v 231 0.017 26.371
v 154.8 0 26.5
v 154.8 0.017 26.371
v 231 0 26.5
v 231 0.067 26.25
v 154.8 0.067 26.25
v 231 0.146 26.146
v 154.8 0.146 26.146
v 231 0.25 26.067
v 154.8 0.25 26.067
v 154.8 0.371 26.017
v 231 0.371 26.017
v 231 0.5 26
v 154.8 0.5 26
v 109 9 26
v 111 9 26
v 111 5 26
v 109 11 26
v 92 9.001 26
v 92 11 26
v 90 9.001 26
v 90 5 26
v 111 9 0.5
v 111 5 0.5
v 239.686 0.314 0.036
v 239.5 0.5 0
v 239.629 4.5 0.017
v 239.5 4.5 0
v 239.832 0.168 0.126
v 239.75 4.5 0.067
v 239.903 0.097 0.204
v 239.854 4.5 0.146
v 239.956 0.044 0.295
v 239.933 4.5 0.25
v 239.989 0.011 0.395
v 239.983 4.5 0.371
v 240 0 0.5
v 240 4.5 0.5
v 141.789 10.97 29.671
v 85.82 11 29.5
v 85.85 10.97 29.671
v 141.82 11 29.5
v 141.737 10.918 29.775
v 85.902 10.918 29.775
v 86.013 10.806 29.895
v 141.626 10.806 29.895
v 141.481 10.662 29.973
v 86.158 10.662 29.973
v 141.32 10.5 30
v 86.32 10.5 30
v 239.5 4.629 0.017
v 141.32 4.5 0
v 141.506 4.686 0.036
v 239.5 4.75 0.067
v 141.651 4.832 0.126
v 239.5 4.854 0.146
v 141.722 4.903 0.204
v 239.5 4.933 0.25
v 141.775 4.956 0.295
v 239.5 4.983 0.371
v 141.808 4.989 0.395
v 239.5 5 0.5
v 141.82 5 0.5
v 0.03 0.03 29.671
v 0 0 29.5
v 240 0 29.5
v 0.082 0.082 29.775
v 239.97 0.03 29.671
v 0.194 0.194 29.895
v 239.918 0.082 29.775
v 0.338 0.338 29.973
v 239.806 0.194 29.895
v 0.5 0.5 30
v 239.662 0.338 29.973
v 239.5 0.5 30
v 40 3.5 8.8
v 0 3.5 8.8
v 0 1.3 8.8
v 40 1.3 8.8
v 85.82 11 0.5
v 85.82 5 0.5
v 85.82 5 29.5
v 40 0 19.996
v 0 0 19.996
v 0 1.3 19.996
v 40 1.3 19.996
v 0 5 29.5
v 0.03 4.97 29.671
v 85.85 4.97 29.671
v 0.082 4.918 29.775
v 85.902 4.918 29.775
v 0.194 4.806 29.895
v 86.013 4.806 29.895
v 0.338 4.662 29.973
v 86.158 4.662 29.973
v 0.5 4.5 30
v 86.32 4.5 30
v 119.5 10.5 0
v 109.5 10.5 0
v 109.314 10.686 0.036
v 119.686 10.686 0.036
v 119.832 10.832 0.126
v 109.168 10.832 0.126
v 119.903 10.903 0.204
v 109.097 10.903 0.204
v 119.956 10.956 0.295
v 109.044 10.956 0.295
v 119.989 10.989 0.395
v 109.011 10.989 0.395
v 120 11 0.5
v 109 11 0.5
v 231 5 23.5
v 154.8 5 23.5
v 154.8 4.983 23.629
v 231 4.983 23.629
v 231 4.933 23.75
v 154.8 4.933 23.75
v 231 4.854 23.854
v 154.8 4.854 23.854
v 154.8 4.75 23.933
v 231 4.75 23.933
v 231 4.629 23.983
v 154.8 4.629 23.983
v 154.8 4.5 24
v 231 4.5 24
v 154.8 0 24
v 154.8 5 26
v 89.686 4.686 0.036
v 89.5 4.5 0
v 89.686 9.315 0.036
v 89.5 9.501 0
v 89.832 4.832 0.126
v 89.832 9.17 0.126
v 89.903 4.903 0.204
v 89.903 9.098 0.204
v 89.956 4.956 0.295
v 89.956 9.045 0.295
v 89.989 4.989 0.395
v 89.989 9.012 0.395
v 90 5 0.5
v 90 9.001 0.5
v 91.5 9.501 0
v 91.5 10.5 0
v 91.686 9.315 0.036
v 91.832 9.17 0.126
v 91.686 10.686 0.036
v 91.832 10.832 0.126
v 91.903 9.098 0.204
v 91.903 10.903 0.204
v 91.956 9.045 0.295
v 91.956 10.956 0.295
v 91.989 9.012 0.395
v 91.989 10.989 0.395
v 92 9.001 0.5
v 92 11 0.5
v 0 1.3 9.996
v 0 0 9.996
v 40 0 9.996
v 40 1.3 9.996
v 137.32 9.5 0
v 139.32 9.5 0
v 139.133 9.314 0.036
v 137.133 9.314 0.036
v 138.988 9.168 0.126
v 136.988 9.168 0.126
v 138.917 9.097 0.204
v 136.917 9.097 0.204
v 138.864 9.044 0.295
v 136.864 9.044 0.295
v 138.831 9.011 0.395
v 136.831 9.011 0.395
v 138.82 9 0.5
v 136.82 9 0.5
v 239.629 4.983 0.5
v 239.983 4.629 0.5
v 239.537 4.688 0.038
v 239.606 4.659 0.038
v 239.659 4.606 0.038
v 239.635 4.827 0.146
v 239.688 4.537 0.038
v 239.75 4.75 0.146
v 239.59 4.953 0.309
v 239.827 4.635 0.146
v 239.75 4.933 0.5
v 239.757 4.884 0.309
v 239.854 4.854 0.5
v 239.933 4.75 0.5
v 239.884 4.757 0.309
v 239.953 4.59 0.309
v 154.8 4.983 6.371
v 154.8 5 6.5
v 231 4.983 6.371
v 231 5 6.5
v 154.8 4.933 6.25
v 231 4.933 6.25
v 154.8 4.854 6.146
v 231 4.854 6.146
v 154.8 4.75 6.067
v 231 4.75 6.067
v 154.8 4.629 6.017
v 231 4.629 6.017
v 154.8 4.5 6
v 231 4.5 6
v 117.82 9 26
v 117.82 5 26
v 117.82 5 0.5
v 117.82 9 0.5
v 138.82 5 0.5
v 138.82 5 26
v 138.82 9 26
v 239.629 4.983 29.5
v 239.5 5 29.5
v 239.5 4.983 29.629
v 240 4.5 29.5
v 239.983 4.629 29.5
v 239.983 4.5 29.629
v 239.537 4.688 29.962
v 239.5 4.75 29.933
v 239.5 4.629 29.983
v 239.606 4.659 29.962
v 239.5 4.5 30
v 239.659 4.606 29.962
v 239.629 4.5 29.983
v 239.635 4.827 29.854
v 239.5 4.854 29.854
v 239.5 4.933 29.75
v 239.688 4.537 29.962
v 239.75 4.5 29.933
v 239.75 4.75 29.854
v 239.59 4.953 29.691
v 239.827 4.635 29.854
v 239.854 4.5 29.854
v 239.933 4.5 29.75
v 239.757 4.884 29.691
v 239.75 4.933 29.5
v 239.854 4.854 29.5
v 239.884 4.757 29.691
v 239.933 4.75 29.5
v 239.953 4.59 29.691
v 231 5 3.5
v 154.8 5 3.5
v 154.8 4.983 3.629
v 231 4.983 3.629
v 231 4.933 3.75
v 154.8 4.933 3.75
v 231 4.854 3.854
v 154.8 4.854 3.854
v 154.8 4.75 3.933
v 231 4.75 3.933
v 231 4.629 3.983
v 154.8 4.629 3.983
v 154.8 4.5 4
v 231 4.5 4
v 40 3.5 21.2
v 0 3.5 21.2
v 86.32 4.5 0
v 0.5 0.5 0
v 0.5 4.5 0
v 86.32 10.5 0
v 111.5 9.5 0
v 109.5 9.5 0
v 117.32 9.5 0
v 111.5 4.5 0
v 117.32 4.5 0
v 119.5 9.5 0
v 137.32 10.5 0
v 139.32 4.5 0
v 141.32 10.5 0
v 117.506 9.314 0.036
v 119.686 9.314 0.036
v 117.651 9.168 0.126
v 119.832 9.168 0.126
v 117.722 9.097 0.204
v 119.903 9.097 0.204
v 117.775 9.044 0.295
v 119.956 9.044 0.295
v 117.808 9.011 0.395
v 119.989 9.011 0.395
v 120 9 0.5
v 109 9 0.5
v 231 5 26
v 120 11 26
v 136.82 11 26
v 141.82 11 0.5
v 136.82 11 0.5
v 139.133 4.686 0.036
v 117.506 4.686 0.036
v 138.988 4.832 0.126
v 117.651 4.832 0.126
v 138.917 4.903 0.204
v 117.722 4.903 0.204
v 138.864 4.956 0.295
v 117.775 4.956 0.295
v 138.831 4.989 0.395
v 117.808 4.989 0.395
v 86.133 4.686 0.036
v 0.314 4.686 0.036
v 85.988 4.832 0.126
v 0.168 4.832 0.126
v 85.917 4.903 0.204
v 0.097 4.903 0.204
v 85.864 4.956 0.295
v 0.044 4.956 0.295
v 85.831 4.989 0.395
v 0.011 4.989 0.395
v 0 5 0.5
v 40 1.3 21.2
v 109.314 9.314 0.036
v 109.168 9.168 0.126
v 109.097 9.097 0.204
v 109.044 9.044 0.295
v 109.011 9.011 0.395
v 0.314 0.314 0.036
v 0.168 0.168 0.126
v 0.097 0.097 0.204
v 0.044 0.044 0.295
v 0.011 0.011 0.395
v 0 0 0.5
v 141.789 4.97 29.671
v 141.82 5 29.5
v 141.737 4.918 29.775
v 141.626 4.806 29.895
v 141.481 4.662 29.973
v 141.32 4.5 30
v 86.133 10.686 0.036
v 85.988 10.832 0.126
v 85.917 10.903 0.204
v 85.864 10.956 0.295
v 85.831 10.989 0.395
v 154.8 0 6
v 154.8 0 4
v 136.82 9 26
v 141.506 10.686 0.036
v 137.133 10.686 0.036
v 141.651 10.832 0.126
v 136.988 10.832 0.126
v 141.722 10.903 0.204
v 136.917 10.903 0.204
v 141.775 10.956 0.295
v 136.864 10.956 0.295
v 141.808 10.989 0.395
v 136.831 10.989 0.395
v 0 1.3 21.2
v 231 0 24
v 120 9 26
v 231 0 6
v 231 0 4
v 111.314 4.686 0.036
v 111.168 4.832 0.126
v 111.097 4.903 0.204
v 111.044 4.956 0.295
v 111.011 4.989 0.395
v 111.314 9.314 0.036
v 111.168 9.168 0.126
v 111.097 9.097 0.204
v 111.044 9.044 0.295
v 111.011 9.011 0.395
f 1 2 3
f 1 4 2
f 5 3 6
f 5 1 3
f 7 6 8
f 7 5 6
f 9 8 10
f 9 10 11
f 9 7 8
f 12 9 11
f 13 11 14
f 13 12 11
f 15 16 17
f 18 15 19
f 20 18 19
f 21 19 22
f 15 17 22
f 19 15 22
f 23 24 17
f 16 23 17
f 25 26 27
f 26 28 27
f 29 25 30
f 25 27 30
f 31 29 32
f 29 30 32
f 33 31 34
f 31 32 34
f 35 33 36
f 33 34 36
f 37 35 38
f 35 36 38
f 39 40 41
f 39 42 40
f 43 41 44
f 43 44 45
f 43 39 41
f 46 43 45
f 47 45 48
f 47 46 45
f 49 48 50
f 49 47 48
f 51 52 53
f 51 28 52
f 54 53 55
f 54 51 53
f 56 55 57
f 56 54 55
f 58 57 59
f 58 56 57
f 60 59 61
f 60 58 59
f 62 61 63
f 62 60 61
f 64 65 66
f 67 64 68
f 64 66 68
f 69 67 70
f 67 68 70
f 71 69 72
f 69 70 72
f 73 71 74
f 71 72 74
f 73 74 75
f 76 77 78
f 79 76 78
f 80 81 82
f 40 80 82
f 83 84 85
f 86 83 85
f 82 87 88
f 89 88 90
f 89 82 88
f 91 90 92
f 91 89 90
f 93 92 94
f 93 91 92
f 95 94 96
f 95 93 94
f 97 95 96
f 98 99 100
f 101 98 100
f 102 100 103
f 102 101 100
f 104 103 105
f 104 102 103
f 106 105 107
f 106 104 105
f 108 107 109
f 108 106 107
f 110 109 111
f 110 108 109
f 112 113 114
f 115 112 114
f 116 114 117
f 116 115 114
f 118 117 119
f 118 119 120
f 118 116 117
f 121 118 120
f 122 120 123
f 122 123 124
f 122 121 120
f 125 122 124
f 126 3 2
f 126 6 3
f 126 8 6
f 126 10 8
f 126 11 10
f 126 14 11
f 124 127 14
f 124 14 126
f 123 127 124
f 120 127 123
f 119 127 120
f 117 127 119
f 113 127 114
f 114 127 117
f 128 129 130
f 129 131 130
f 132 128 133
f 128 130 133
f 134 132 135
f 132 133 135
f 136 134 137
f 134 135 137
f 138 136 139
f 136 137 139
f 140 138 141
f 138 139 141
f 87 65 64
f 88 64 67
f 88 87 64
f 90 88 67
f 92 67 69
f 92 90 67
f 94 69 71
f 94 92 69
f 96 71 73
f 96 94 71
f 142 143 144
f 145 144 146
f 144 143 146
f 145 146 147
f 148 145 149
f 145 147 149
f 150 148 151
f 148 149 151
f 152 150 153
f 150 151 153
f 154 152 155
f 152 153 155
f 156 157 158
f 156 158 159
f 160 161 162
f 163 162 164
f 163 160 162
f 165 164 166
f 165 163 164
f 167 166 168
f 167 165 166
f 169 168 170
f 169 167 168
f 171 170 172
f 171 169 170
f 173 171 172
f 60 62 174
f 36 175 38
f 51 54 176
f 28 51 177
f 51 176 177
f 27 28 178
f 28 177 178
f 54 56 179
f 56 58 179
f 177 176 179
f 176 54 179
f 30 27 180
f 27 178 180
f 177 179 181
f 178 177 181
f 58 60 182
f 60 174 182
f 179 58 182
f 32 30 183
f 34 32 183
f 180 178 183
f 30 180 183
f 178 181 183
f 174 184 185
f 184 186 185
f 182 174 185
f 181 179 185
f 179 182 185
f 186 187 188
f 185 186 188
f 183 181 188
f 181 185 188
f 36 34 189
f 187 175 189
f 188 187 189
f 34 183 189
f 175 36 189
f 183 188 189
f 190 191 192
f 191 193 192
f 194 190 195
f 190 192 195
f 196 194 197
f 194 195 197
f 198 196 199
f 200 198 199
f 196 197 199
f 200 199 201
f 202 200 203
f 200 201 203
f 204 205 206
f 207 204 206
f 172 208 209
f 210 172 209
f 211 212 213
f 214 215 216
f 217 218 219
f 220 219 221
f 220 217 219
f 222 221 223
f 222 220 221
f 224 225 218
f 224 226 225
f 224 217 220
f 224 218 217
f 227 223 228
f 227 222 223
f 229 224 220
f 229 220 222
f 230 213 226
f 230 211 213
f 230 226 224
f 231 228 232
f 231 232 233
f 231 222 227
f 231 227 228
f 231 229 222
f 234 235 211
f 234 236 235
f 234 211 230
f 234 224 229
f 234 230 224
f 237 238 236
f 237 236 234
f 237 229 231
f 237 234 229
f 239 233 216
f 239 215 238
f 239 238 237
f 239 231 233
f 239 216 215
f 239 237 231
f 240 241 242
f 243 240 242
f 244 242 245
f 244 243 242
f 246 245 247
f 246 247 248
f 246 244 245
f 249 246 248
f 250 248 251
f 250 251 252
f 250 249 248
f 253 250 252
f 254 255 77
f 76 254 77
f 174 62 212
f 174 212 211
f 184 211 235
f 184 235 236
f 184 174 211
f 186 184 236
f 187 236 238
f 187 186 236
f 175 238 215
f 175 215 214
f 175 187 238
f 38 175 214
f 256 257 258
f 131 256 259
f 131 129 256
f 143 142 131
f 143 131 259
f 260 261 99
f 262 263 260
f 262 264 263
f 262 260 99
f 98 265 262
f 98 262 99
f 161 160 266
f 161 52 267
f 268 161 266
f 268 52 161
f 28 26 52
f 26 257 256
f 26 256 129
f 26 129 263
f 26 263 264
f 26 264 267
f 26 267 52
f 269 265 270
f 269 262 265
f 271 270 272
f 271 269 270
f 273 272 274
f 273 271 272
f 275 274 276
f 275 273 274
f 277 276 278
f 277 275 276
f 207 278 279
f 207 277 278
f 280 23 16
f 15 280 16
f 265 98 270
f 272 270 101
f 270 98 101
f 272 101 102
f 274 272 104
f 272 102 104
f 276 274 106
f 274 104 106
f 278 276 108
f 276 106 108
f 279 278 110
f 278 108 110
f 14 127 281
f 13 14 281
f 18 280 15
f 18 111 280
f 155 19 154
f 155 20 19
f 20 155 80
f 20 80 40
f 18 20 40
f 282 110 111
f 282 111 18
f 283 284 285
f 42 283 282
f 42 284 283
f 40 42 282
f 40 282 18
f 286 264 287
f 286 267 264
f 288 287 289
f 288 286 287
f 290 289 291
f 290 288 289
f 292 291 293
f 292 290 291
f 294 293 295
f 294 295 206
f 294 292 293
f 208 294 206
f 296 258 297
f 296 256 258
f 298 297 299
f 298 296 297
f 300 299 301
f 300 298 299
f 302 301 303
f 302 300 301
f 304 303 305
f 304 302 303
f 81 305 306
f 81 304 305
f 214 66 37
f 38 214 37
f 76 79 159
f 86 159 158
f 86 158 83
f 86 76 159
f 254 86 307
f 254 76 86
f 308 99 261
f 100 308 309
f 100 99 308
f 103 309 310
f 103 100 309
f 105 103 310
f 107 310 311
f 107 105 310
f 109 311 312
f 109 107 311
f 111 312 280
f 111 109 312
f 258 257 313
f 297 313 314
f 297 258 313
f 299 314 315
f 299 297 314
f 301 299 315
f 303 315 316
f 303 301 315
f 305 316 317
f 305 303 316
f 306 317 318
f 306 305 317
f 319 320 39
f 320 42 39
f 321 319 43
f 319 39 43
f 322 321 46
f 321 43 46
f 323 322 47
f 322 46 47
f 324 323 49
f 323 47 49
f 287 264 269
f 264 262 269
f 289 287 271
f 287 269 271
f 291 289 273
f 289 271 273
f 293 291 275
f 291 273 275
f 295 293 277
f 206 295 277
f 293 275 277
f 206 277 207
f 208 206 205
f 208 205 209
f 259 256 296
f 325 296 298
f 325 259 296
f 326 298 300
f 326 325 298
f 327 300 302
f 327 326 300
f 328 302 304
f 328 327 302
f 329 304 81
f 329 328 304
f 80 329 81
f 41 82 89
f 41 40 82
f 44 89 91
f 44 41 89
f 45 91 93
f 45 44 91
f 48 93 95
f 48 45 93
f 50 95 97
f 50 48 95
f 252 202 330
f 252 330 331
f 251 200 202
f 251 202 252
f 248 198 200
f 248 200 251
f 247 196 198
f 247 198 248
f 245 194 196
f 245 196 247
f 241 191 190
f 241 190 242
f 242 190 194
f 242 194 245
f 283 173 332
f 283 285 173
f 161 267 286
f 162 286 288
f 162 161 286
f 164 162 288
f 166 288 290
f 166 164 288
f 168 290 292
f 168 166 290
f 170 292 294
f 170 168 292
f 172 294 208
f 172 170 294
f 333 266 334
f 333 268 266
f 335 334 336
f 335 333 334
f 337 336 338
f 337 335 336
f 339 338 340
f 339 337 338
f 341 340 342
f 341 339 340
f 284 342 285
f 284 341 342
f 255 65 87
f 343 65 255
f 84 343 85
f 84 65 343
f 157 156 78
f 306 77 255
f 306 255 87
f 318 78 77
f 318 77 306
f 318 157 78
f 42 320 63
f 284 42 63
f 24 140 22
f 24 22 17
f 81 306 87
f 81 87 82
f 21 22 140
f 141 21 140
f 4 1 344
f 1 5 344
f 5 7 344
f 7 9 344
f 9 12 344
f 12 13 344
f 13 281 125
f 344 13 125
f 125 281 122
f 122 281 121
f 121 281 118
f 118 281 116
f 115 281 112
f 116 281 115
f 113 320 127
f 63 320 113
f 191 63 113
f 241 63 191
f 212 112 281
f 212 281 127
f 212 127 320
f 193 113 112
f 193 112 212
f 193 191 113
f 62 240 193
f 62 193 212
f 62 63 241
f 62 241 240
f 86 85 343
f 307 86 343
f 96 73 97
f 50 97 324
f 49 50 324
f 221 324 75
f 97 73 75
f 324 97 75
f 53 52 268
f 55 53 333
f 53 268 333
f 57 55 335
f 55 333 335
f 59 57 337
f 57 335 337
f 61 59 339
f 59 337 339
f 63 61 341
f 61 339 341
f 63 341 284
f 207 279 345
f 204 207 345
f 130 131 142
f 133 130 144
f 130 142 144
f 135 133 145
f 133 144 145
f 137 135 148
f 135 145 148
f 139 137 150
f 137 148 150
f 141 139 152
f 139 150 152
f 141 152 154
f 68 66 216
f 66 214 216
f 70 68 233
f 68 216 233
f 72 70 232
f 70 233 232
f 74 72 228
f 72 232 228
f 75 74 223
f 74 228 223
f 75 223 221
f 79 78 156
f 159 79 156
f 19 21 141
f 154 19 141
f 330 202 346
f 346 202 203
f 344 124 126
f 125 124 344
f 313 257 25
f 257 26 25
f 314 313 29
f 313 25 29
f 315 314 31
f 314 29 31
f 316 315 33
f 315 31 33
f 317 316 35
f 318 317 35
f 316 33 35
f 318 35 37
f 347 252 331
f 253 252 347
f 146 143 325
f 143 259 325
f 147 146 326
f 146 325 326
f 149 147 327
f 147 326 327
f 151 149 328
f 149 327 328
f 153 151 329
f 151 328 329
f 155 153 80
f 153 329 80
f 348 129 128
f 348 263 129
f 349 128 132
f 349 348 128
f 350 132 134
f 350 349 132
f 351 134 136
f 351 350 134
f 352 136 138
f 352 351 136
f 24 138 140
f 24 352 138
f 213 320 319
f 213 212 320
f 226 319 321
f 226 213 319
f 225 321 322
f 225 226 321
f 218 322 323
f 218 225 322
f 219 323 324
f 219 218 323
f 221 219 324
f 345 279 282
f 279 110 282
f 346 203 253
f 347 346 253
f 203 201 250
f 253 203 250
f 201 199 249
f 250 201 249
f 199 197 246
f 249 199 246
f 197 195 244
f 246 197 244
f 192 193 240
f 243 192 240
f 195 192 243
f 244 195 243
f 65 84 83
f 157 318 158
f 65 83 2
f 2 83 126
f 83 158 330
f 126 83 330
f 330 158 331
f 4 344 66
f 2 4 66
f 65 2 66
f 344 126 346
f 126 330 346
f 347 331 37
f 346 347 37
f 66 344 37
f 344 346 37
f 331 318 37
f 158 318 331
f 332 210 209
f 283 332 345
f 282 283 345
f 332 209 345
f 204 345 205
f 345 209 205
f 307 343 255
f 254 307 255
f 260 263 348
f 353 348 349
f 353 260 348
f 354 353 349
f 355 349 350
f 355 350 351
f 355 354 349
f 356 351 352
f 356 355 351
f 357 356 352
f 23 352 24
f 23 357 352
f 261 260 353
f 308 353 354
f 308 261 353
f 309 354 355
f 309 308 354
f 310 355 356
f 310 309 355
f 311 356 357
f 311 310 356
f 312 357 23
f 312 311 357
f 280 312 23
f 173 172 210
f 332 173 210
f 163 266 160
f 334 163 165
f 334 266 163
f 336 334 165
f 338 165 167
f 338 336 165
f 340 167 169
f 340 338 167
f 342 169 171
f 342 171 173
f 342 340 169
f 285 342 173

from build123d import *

# Parameters (mm, degrees)
SKETCH2_W                = 240
SKETCH2_H                = 30
BOSS_EXTRUDE1_DEPTH      = 5
BOSS_EXTRUDE2_DEPTH      = 6
BOSS_EXTRUDE3_DEPTH      = 2
BOSS_EXTRUDE3_DEPTH_BACK = 9
SKETCH4_W                = 26
SKETCH4_H                = 2
SKETCH5_W                = 26
SKETCH5_H                = 1.998827679
BOSS_EXTRUDE4_DEPTH      = 2
SKETCH6_W                = 26
SKETCH6_H                = 2
BOSS_EXTRUDE5_DEPTH      = 2
SKETCH8_W                = 76.2
SKETCH8_H                = 2
CUT_EXTRUDE1_DEPTH       = 6
SKETCH9_W                = 10
SKETCH9_H                = 1.3
CUT_EXTRUDE2_DEPTH       = 40
FILLET1_R                = 0.5


with BuildPart() as part:
    # Sketch2 → Boss-Extrude1 (new body)
    with BuildSketch(Plane(origin=(0, 0, 0), x_dir=(1, 0, 0), z_dir=(0, 1, 0))):
        with Locations((120, -15)):
            Rectangle(SKETCH2_W, SKETCH2_H)
    extrude(amount=BOSS_EXTRUDE1_DEPTH)

    # Sketch3 → Boss-Extrude2 (add)
    with BuildSketch(Plane(origin=(0, 5, 0), x_dir=(1, 0, 0), z_dir=(0, 1, 0))):
        Polygon((90, 0), (85.819507893, 0), (85.819507893, -30), (141.819507893, -30), (141.819507893, 0), (138.819507893, 0), (138.819507893, -26), (117.819507893, -26), (117.819507893, 0), (111, 0), (111, -26), (90, -26), align=None)
    extrude(amount=BOSS_EXTRUDE2_DEPTH)

    # Sketch4 → Boss-Extrude3 (add, two sides: drawn at the far end of the back side and taken through both)
    with BuildSketch(Plane.ZY.offset(-111).offset(-BOSS_EXTRUDE3_DEPTH_BACK)):
        with Locations((13, 10)):
            Rectangle(SKETCH4_W, SKETCH4_H)
    extrude(amount=BOSS_EXTRUDE3_DEPTH + BOSS_EXTRUDE3_DEPTH_BACK)

    # Sketch5 → Boss-Extrude4 (add)
    with BuildSketch(Plane(origin=(90, 0, 0), x_dir=(0, 0, -1), z_dir=(1, 0, 0))):
        with Locations((-13, 10.00058616)):
            Rectangle(SKETCH5_W, SKETCH5_H)
    extrude(amount=BOSS_EXTRUDE4_DEPTH)

    # Sketch6 → Boss-Extrude5 (add)
    with BuildSketch(Plane.ZY.offset(-138.819507893)):
        with Locations((13, 10)):
            Rectangle(SKETCH6_W, SKETCH6_H)
    extrude(amount=BOSS_EXTRUDE5_DEPTH)

    # Sketch8 → Cut-Extrude1 (cut)
    with BuildSketch(Plane(origin=(0, 5, 0), x_dir=(1, 0, 0), z_dir=(0, 1, 0))):
        with Locations((192.9, -25)):
            Rectangle(SKETCH8_W, SKETCH8_H)
        with Locations((192.9, -5)):
            Rectangle(SKETCH8_W, SKETCH8_H)
    extrude(amount=-CUT_EXTRUDE1_DEPTH, mode=Mode.SUBTRACT)

    # Sketch9 → Cut-Extrude2 (cut)
    with BuildSketch(Plane.ZY):
        with Locations((14.996078434, 0.65)):
            Rectangle(SKETCH9_W, SKETCH9_H)
        Polygon((21.2, 1.3), (21.2, 3.5), (15, 3.5), (8.8, 3.5), (8.8, 1.3), align=None)
    extrude(amount=-CUT_EXTRUDE2_DEPTH, mode=Mode.SUBTRACT)

    # Fillet1
    fillet1_edges = [part.edges().sort_by_distance(p)[0] for p in [
        (192.9, 0, 26),
        (42.909753947, 5, 30),
        (192.9, 5, 4),
        (192.9, 5, 6),
        (192.9, 5, 24),
        (240, 5, 15),
        (190.909753947, 5, 30),
        (100.5, 5, 0),
        (128.319507893, 5, 0),
        (190.909753947, 5, 0),
        (42.909753947, 5, 0),
        (85.819507893, 8, 0),
        (85.819507893, 8, 30),
        (141.819507893, 8, 30),
        (141.819507893, 8, 0),
        (113.819507893, 11, 30),
        (139.319507893, 11, 0),
        (114.5, 11, 0),
        (88.909753947, 11, 0),
        (111, 7, 0),
        (117.819507893, 7, 0),
        (118.909753947, 9, 0),
        (120, 10, 0),
        (120, 0, 0),
        (110, 9, 0),
        (109, 10, 0),
        (120, 0, 30),
        (90, 7.000586161, 0),
        (91, 9.001172321, 0),
        (92, 10.000586161, 0),
        (138.819507893, 7, 0),
        (0, 2.5, 0),
        (137.819507893, 9, 0),
        (240, 2.5, 0),
        (136.819507893, 10, 0),
        (240, 2.5, 30),
        (0, 2.5, 30),
    ]]
    fillet(fillet1_edges, radius=FILLET1_R)


solid = part.part
